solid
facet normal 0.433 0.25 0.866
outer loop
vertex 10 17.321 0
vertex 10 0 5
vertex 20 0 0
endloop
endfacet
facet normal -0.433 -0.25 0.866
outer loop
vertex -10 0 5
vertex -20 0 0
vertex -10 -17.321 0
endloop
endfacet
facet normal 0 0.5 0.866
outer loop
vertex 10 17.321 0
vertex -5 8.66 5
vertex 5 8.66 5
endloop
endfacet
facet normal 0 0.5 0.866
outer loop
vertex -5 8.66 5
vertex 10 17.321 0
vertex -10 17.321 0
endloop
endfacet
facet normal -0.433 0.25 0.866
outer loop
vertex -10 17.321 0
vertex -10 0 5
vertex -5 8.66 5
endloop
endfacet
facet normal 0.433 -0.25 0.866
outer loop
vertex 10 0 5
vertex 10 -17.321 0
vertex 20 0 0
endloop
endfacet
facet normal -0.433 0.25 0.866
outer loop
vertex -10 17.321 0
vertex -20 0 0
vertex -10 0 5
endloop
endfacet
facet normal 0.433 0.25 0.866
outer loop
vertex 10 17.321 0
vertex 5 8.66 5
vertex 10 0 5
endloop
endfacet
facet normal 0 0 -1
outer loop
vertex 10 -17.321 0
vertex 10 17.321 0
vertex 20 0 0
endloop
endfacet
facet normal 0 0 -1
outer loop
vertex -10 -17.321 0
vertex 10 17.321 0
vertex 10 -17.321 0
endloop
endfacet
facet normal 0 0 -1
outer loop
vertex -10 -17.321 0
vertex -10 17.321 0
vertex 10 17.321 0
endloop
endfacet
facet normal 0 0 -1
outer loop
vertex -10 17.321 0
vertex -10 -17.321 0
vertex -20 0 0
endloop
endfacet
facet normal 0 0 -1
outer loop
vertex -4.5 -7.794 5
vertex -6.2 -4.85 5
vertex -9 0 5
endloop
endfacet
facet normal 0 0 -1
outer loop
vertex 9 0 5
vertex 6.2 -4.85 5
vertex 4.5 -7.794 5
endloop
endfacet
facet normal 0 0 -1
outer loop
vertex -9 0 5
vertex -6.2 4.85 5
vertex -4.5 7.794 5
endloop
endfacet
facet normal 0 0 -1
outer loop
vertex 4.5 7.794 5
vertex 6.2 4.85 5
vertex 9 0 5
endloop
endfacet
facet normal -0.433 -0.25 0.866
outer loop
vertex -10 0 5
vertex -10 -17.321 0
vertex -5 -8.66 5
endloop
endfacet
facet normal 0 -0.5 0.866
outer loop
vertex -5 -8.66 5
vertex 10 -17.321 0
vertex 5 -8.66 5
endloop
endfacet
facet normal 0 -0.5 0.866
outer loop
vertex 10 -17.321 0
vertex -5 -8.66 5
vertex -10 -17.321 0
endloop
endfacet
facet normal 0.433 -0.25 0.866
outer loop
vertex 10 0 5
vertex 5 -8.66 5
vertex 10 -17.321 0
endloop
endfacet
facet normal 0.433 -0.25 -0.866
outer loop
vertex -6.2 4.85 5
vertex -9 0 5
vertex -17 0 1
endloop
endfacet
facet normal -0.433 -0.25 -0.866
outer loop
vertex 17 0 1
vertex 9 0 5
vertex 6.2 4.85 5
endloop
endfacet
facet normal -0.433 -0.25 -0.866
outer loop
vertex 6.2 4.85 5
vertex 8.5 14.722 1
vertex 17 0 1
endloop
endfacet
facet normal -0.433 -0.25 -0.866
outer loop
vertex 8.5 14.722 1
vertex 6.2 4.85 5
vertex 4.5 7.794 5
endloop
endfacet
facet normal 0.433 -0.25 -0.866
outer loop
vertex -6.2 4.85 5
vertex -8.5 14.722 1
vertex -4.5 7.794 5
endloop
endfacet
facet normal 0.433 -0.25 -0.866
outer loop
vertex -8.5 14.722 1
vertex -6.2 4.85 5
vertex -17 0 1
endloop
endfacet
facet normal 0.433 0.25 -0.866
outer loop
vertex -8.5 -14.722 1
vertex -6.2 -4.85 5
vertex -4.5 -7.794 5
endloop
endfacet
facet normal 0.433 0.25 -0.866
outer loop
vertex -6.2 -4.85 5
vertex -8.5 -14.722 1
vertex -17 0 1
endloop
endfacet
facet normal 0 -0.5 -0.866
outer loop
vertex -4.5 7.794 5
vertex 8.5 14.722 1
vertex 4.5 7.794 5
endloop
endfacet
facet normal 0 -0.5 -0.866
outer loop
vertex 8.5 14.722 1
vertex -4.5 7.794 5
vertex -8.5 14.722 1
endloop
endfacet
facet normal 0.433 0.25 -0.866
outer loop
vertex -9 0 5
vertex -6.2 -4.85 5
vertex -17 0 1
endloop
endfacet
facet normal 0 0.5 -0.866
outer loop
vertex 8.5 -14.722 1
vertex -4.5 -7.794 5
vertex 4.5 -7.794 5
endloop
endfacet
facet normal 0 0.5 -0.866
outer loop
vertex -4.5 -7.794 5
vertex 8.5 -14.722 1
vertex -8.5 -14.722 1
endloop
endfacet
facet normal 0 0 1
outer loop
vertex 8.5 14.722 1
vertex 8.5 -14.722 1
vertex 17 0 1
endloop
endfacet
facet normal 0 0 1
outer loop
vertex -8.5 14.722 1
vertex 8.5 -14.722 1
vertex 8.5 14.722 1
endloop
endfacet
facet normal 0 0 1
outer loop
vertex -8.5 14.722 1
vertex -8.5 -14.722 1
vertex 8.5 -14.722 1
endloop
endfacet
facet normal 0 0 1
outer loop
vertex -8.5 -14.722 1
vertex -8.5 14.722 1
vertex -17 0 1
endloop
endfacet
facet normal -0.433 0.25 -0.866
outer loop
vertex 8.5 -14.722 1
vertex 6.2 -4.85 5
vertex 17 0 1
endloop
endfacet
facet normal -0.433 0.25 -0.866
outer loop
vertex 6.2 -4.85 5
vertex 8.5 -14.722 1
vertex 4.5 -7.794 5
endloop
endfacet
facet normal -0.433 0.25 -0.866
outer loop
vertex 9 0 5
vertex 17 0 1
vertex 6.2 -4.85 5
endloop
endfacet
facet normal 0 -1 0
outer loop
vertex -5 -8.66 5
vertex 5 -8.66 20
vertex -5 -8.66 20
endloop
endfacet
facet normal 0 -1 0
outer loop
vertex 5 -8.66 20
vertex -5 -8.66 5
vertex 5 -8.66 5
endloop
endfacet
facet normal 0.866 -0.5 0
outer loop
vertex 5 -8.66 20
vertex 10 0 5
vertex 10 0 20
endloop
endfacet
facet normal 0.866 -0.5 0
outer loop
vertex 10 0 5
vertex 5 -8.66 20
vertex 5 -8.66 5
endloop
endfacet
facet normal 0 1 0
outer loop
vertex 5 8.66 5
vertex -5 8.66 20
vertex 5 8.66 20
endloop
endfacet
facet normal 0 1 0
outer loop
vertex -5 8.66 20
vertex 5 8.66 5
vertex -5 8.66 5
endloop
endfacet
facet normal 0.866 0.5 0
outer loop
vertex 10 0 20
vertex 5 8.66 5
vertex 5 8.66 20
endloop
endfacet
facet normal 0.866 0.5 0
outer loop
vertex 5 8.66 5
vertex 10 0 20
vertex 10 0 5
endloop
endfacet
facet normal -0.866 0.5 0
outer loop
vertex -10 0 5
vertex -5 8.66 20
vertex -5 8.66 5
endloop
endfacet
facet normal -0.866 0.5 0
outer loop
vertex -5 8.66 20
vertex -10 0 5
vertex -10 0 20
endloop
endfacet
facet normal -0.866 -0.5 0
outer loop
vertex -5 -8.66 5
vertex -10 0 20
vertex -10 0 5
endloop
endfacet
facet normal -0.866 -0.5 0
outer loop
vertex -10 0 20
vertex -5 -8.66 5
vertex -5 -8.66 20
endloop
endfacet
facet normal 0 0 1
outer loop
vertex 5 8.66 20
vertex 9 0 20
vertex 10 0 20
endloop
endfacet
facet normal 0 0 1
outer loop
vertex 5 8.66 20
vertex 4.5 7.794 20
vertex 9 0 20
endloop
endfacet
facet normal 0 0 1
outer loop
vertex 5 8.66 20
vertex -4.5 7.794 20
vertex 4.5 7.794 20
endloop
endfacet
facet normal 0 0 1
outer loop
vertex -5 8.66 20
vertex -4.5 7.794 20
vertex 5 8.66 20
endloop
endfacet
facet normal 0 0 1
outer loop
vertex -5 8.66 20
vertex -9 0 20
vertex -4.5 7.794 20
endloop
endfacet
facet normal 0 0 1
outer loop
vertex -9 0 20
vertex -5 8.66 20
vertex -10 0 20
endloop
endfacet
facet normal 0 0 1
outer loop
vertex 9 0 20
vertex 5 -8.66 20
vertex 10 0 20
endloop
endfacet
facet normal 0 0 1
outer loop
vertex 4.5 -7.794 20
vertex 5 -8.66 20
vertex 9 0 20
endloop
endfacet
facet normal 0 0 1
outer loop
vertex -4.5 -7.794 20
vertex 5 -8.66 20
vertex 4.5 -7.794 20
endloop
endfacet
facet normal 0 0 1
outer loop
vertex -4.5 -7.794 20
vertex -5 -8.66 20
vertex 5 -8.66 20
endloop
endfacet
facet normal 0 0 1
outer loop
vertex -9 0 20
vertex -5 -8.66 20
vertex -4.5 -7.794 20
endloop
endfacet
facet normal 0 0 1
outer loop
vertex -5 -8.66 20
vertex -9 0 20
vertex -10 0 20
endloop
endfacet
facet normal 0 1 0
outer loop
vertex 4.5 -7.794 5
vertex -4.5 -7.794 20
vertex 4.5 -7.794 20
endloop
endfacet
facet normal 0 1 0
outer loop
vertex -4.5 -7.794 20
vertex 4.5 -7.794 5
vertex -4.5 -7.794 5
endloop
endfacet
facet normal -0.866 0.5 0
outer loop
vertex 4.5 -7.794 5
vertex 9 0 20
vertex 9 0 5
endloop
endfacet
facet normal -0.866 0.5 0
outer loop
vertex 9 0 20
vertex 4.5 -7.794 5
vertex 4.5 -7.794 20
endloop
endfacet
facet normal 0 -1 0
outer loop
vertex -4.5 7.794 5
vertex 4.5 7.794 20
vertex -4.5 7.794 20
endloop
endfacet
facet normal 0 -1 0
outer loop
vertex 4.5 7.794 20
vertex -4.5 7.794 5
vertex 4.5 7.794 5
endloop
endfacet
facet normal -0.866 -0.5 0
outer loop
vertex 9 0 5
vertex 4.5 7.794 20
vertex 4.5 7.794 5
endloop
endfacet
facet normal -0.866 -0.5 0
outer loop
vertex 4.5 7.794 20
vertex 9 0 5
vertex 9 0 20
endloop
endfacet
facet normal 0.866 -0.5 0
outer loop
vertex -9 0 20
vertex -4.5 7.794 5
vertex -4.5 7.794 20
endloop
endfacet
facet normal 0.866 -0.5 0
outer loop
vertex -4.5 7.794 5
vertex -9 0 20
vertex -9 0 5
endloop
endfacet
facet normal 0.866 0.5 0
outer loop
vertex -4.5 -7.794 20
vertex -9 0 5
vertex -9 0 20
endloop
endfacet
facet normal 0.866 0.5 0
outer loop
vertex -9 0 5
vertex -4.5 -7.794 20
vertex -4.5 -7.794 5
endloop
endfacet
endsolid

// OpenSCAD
$fn=50;
//circle(r=10,$fn = 6);
baseheight = 5;
basebottomrad = 20;
basetoprad = 10;
gripheight = 15;
numberofsides = 6;

difference(){
cylinder(  baseheight,    basebottomrad,    basetoprad, $fn = numberofsides);
translate([0,0,1])cylinder(  baseheight,    basebottomrad -3,    basetoprad-3, $fn = numberofsides);

}

difference(){
translate([0,0,5])cylinder(  gripheight,    basetoprad,    basetoprad, $fn = numberofsides);
translate([0,0,5])cylinder(  gripheight,    basetoprad-1 ,    basetoprad-1, $fn = numberofsides);

}
